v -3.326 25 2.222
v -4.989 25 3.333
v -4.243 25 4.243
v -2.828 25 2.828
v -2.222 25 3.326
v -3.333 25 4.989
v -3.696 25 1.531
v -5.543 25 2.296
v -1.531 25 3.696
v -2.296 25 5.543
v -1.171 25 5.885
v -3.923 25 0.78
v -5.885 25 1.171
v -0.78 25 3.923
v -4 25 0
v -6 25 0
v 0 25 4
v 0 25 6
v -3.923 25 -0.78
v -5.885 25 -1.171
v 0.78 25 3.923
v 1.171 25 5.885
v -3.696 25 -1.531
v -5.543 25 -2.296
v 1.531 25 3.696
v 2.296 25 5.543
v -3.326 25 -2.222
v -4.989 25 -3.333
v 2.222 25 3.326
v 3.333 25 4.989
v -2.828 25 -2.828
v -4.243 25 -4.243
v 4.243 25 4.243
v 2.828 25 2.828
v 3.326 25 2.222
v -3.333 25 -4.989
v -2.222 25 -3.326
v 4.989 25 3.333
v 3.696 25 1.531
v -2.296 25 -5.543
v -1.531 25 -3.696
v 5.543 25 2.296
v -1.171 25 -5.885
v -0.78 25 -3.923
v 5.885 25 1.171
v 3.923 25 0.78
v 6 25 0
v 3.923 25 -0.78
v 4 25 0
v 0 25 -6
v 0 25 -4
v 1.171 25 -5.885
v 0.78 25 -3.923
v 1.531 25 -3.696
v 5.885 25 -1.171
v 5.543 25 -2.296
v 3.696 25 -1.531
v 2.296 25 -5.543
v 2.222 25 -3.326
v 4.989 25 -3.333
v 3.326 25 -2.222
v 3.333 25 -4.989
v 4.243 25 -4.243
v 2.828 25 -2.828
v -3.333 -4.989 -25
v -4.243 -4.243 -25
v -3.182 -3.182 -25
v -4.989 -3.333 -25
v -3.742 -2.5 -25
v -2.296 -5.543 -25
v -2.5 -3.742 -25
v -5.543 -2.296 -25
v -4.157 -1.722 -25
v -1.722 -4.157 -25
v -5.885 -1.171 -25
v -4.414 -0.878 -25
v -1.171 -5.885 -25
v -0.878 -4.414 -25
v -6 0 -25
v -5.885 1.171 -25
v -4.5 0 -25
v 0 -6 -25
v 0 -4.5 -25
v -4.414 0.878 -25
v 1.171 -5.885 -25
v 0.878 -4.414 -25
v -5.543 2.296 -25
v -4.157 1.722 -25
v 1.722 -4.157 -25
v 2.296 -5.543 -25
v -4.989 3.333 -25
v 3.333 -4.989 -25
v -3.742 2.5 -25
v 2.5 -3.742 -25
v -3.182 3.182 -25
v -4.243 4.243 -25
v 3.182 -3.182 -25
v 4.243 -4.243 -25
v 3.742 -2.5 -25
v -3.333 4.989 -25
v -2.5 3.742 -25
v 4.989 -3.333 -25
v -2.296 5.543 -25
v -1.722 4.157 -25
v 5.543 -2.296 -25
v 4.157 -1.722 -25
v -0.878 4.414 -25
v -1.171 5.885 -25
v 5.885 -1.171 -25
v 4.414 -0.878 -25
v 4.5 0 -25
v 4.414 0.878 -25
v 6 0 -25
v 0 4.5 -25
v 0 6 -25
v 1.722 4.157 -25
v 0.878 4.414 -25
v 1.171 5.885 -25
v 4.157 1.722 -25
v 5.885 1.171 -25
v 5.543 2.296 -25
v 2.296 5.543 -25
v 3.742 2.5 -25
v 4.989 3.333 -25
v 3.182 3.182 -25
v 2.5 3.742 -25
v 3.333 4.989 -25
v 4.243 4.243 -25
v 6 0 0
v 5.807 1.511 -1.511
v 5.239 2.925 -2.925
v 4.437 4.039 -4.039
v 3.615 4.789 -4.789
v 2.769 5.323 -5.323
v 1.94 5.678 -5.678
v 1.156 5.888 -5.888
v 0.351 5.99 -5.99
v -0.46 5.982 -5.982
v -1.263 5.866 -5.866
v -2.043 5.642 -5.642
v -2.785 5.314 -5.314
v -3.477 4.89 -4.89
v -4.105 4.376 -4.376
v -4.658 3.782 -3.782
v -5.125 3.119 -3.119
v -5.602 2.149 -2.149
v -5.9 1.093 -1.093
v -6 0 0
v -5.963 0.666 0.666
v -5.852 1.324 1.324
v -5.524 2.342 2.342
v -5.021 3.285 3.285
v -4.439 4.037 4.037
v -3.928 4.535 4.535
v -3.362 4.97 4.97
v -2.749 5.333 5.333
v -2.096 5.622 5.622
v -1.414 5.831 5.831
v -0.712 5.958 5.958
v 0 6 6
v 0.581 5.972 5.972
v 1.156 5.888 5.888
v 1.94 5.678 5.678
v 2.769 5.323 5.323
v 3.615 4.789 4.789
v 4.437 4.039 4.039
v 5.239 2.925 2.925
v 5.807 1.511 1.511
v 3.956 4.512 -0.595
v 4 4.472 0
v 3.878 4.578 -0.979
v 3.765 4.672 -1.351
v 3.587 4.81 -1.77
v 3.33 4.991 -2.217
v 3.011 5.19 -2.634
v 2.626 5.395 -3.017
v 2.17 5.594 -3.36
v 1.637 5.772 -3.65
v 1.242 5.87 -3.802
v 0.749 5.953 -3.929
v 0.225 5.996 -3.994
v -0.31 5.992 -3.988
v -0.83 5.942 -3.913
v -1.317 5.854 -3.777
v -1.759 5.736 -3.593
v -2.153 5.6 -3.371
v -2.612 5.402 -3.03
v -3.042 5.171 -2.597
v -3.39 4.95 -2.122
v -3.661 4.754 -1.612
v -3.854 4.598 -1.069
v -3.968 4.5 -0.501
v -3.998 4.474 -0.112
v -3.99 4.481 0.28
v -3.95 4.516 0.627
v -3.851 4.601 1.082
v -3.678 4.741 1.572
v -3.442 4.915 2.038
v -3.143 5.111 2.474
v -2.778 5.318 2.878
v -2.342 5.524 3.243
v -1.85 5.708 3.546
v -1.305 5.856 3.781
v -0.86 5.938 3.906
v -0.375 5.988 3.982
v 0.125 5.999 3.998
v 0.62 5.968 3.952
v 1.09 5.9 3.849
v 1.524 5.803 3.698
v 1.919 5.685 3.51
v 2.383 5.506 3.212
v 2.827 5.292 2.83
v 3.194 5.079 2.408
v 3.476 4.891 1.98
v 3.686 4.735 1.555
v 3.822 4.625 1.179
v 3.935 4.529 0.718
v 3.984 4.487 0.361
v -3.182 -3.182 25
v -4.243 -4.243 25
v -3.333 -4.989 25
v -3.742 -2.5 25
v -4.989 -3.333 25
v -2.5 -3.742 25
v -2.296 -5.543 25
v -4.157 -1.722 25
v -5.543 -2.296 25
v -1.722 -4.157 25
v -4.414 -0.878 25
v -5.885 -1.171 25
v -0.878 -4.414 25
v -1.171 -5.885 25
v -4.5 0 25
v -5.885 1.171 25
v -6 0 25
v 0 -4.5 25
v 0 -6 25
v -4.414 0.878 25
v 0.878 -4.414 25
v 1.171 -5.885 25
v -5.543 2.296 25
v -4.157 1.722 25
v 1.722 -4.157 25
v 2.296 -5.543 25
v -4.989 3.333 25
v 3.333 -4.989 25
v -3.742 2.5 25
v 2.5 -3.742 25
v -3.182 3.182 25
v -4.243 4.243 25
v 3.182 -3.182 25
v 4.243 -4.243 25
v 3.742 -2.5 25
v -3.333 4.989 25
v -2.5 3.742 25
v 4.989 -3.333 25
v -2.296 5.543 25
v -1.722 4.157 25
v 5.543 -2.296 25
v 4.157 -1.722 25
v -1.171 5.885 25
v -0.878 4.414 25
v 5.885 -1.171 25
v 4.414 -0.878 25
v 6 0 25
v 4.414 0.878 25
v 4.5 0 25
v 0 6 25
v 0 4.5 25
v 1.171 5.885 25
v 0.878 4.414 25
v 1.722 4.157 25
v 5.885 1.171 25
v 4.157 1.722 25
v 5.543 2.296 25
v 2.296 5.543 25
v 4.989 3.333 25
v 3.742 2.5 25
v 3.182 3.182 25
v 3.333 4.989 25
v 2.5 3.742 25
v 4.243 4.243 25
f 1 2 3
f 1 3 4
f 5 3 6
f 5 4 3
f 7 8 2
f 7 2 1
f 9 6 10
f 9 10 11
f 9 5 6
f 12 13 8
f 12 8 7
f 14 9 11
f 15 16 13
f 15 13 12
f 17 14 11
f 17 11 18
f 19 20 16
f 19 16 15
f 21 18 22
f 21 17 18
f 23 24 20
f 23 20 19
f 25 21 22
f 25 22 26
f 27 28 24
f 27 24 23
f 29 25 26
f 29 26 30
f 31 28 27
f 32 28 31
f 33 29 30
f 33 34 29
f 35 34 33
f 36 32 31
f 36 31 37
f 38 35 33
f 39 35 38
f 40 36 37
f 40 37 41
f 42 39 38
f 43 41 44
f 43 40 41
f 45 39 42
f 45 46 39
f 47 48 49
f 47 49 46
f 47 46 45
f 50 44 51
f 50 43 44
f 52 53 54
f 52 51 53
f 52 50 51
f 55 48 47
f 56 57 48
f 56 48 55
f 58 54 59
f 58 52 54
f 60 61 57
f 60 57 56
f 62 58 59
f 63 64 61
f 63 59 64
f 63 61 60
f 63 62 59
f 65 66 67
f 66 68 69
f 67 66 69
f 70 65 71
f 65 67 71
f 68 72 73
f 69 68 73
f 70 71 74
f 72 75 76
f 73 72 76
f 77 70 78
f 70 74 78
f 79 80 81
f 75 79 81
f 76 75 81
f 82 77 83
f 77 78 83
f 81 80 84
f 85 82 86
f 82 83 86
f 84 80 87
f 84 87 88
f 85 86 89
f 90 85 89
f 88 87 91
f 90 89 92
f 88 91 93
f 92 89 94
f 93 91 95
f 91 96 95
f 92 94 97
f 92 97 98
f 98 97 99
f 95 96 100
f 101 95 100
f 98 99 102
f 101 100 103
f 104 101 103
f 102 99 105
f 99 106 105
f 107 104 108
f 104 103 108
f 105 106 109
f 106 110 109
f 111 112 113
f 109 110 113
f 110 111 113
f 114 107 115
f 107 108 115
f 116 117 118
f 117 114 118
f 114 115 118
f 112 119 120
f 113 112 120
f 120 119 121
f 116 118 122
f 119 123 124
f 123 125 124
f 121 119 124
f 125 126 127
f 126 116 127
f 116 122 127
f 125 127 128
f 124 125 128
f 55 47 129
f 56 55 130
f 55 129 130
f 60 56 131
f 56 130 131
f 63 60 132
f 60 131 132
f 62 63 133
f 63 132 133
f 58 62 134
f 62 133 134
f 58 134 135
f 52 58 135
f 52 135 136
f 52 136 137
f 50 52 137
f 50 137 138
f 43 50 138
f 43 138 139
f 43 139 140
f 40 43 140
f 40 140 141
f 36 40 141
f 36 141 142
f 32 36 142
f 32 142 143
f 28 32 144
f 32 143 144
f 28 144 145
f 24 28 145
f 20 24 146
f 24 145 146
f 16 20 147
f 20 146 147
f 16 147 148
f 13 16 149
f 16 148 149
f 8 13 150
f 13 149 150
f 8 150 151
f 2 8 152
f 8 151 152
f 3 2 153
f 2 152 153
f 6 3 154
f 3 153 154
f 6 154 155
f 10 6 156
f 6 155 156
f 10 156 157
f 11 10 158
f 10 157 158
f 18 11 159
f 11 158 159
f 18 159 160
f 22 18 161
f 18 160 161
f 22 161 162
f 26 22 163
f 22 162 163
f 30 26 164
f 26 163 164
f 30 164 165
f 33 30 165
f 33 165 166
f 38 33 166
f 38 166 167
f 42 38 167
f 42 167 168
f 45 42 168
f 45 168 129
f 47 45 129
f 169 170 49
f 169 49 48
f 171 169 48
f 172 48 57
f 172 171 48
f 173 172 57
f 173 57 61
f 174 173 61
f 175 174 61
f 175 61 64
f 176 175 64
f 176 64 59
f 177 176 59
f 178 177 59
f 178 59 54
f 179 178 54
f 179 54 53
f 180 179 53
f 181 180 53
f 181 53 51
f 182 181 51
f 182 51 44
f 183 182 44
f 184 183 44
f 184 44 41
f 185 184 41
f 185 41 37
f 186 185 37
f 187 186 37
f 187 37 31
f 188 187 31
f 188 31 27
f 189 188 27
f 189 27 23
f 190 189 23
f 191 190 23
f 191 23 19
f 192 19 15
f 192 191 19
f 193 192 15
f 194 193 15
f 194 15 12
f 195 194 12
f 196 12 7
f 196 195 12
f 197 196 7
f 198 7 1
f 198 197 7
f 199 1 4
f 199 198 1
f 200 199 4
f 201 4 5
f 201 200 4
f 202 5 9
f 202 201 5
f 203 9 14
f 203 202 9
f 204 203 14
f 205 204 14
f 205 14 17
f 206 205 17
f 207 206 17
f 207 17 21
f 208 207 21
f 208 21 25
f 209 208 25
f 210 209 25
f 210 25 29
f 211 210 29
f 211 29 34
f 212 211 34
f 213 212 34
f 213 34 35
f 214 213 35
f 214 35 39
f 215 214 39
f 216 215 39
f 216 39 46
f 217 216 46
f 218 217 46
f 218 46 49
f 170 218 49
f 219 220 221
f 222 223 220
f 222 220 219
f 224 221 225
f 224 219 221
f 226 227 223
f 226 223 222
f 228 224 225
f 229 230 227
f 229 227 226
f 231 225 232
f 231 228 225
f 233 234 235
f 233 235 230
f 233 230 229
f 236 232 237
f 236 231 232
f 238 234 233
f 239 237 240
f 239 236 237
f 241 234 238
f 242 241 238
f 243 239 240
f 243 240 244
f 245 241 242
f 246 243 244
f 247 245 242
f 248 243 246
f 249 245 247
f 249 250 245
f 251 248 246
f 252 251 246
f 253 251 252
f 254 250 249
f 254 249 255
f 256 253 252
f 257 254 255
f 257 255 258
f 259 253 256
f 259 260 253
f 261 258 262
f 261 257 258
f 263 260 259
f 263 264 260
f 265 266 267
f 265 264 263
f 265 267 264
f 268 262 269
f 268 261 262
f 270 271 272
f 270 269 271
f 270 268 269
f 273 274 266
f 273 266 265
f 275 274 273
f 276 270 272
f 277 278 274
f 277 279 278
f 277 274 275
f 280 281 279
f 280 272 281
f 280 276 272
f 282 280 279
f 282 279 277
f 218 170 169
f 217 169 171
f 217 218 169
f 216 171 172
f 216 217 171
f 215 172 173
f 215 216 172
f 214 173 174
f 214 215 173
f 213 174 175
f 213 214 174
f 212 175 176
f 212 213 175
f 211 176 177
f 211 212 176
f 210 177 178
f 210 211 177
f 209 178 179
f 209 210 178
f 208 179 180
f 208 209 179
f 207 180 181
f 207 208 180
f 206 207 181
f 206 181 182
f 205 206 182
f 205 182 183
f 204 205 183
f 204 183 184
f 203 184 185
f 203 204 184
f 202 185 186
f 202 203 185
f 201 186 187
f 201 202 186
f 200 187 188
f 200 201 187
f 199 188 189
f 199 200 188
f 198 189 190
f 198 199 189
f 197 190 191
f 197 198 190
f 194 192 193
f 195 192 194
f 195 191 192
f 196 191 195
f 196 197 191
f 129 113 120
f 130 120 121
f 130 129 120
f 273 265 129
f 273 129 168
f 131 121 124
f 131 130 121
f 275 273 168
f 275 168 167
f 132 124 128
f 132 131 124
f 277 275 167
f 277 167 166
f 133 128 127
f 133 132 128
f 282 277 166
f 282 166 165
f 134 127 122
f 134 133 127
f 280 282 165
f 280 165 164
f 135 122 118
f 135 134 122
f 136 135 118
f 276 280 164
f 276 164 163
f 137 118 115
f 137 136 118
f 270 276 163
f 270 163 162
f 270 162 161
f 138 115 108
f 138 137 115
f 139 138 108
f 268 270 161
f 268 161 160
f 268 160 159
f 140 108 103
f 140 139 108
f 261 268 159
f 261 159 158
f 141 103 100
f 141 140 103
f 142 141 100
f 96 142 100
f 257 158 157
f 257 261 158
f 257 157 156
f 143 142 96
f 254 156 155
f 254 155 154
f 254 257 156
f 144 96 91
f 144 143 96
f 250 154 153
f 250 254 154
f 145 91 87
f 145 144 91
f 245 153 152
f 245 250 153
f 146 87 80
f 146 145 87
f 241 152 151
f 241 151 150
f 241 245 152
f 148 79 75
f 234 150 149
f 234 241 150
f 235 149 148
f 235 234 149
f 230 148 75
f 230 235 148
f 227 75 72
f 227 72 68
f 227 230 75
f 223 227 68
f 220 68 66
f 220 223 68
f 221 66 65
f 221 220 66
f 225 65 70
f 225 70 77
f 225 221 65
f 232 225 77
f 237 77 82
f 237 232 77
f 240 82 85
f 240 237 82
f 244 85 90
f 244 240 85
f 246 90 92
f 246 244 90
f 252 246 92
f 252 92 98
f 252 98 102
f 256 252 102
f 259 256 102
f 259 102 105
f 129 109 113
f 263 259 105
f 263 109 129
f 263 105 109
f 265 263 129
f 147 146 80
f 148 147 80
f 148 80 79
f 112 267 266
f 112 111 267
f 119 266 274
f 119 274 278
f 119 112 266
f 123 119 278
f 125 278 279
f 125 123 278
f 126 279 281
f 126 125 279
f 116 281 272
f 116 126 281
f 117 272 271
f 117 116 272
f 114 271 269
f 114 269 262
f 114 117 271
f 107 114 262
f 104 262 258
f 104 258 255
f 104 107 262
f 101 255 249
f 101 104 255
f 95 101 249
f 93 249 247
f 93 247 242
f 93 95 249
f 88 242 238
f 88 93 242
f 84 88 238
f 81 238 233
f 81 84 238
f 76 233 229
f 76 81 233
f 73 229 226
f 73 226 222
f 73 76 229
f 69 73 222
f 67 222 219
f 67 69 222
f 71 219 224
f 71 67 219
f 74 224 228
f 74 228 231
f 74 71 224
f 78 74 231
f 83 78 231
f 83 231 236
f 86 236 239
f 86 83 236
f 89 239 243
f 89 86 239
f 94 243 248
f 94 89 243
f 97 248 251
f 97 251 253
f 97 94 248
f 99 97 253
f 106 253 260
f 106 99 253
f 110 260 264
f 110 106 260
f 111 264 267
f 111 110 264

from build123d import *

# Parameters (mm, degrees)
CROQUIS1_R              = 6
CROQUIS1_R_2            = 4.5
SALIENTE_EXTRUIR1_DEPTH = 25
CROQUIS2_R              = 6
CROQUIS2_R_2            = 4
SALIENTE_EXTRUIR2_DEPTH = 25
CROQUIS3_R              = 4.5
CORTAR_EXTRUIR1_DEPTH   = 51.0000001


with BuildPart() as part:
    # Croquis1 → Saliente-Extruir1 (new body, symmetric)
    with BuildSketch(Plane.XY):
        Circle(CROQUIS1_R)
        Circle(CROQUIS1_R_2, mode=Mode.SUBTRACT)
    extrude(amount=SALIENTE_EXTRUIR1_DEPTH, both=True)

    # Croquis2 → Saliente-Extruir2 (add)
    with BuildSketch(Plane(origin=(0, 0, 0), x_dir=(1, 0, 0), z_dir=(0, 1, 0))):
        Circle(CROQUIS2_R)
        Circle(CROQUIS2_R_2, mode=Mode.SUBTRACT)
    extrude(amount=SALIENTE_EXTRUIR2_DEPTH)

    # Croquis3 → Cortar-Extruir1 (cut, through all)
    with BuildSketch(Plane.XY.offset(25)):
        Circle(CROQUIS3_R)
    extrude(amount=-CORTAR_EXTRUIR1_DEPTH, mode=Mode.SUBTRACT)


solid = part.part
